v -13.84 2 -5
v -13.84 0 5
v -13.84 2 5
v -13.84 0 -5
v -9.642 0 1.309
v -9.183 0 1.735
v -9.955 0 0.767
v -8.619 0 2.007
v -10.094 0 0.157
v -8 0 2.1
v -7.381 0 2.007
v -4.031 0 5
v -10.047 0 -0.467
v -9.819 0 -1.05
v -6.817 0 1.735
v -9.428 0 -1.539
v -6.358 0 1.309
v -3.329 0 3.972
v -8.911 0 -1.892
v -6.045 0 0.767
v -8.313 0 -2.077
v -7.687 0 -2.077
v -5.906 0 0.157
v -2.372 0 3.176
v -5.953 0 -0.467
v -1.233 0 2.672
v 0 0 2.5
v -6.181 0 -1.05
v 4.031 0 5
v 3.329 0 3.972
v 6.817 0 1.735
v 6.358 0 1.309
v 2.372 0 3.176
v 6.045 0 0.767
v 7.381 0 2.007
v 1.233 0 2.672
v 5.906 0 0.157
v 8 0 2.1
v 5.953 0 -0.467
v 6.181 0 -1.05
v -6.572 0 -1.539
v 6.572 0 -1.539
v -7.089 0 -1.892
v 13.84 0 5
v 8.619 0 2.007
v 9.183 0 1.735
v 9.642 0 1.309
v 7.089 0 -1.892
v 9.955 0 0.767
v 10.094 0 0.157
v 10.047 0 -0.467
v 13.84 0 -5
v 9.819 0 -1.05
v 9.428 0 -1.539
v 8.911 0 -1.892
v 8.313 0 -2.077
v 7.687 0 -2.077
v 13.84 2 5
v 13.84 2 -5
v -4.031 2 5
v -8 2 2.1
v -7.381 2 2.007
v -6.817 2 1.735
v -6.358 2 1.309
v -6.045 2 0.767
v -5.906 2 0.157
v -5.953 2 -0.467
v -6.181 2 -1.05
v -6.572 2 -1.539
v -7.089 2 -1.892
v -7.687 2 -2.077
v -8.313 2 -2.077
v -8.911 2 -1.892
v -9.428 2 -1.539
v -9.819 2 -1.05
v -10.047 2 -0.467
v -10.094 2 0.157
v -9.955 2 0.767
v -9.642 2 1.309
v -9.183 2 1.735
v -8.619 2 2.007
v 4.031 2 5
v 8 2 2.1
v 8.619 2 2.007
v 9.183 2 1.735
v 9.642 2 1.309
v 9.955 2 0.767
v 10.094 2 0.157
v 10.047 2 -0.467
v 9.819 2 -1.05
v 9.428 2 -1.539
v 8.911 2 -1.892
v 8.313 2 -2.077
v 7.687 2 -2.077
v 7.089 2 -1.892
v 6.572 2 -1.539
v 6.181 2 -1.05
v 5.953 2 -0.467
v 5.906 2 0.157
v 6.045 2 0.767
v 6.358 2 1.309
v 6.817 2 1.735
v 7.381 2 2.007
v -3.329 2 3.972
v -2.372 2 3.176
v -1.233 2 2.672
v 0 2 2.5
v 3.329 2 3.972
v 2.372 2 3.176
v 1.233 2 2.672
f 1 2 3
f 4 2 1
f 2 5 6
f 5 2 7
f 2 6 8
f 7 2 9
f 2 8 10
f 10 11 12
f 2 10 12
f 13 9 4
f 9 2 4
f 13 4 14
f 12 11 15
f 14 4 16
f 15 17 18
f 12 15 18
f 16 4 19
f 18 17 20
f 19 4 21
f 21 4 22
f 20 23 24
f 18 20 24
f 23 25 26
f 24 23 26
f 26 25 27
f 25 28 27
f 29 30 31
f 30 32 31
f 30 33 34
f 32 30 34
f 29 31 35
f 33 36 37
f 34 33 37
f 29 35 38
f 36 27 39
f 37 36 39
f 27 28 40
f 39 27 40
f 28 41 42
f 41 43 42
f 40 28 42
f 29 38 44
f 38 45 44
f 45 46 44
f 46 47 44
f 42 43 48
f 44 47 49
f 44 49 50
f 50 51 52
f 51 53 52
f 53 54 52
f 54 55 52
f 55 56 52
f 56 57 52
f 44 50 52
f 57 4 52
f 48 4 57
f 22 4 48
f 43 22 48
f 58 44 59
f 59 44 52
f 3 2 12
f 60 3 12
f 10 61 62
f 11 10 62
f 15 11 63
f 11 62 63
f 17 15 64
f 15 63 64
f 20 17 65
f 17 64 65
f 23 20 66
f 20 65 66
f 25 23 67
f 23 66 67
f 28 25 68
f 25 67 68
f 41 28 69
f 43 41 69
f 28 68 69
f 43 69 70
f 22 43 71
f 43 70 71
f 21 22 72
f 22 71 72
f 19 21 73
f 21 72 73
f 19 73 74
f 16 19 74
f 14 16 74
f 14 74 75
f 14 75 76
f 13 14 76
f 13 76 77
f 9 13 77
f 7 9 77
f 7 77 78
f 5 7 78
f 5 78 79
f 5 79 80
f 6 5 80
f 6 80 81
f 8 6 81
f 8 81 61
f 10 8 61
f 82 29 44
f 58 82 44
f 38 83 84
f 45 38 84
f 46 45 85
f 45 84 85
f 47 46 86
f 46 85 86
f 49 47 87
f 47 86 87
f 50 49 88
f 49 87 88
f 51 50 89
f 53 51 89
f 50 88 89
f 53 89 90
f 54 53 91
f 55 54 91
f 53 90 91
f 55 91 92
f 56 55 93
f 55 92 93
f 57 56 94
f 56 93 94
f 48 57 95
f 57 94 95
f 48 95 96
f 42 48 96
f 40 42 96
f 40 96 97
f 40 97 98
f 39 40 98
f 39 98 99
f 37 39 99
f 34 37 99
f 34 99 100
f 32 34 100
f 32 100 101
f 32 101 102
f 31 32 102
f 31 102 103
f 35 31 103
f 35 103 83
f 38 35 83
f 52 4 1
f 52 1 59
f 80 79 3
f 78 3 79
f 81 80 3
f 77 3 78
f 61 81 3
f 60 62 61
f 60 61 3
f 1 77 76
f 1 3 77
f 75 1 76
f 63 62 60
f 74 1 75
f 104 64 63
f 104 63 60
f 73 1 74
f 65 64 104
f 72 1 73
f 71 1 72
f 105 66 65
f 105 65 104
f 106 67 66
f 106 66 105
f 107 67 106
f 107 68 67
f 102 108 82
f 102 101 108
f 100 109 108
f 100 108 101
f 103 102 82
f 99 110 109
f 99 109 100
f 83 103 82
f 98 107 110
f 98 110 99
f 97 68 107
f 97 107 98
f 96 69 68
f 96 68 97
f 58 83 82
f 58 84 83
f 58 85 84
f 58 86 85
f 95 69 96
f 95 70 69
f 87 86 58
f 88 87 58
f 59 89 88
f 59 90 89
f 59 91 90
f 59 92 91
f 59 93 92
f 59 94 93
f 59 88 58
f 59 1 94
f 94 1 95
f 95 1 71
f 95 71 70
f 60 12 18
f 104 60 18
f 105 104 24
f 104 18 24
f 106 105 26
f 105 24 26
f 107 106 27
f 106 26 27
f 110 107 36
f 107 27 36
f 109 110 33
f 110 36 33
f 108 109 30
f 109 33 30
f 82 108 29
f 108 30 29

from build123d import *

# Parameters (mm, degrees)
SKETCH1_W           = 27.68
SKETCH1_H           = 10
BOSS_EXTRUDE1_DEPTH = 2
CUT_EXTRUDE1_REACH  = 16.851
SKETCH2_R           = 2.1
CUT_EXTRUDE2_REACH  = 16.851
SKETCH3_R           = 4.5


with BuildPart() as part:
    # Sketch1 → Boss-Extrude1 (new body)
    with BuildSketch(Plane(origin=(0, 0, 0), x_dir=(1, 0, 0), z_dir=(0, 1, 0))):
        Rectangle(SKETCH1_W, SKETCH1_H)
    extrude(amount=BOSS_EXTRUDE1_DEPTH)

    # Sketch2 → Cut-Extrude1 (cut, up to next)
    with BuildSketch(Plane(origin=(0, 2, 0), x_dir=(1, 0, 0), z_dir=(0, 1, 0)), mode=Mode.PRIVATE) as cut_extrude1_sk1:
        with Locations(Location((8, 0, 0), (0, 0, 270))):
            Circle(SKETCH2_R)
    cut_extrude1_tool1 = extrude(cut_extrude1_sk1.sketch, amount=-CUT_EXTRUDE1_REACH, mode=Mode.PRIVATE) & part.part
    # Sketch2 → Cut-Extrude1 (cut, up to next)
    with BuildSketch(Plane(origin=(0, 2, 0), x_dir=(1, 0, 0), z_dir=(0, 1, 0)), mode=Mode.PRIVATE) as cut_extrude1_sk2:
        with Locations(Location((-8, 0, 0), (0, 0, 270))):
            Circle(SKETCH2_R)
    cut_extrude1_tool2 = extrude(cut_extrude1_sk2.sketch, amount=-CUT_EXTRUDE1_REACH, mode=Mode.PRIVATE) & part.part
    add(cut_extrude1_tool1.solids().sort_by_distance((8, 2, 0))[0], mode=Mode.SUBTRACT)
    add(cut_extrude1_tool2.solids().sort_by_distance((-8, 2, 0))[0], mode=Mode.SUBTRACT)

    # Sketch3 → Cut-Extrude2 (cut, up to next)
    with BuildSketch(Plane.XZ, mode=Mode.PRIVATE) as cut_extrude2_sk1:
        with Locations((0, 7)):
            Circle(SKETCH3_R)
    cut_extrude2_tool1 = extrude(cut_extrude2_sk1.sketch, amount=-CUT_EXTRUDE2_REACH, mode=Mode.PRIVATE) & part.part
    add(cut_extrude2_tool1.solids().sort_by_distance((0, 0, 7))[0], mode=Mode.SUBTRACT)


solid = part.part
